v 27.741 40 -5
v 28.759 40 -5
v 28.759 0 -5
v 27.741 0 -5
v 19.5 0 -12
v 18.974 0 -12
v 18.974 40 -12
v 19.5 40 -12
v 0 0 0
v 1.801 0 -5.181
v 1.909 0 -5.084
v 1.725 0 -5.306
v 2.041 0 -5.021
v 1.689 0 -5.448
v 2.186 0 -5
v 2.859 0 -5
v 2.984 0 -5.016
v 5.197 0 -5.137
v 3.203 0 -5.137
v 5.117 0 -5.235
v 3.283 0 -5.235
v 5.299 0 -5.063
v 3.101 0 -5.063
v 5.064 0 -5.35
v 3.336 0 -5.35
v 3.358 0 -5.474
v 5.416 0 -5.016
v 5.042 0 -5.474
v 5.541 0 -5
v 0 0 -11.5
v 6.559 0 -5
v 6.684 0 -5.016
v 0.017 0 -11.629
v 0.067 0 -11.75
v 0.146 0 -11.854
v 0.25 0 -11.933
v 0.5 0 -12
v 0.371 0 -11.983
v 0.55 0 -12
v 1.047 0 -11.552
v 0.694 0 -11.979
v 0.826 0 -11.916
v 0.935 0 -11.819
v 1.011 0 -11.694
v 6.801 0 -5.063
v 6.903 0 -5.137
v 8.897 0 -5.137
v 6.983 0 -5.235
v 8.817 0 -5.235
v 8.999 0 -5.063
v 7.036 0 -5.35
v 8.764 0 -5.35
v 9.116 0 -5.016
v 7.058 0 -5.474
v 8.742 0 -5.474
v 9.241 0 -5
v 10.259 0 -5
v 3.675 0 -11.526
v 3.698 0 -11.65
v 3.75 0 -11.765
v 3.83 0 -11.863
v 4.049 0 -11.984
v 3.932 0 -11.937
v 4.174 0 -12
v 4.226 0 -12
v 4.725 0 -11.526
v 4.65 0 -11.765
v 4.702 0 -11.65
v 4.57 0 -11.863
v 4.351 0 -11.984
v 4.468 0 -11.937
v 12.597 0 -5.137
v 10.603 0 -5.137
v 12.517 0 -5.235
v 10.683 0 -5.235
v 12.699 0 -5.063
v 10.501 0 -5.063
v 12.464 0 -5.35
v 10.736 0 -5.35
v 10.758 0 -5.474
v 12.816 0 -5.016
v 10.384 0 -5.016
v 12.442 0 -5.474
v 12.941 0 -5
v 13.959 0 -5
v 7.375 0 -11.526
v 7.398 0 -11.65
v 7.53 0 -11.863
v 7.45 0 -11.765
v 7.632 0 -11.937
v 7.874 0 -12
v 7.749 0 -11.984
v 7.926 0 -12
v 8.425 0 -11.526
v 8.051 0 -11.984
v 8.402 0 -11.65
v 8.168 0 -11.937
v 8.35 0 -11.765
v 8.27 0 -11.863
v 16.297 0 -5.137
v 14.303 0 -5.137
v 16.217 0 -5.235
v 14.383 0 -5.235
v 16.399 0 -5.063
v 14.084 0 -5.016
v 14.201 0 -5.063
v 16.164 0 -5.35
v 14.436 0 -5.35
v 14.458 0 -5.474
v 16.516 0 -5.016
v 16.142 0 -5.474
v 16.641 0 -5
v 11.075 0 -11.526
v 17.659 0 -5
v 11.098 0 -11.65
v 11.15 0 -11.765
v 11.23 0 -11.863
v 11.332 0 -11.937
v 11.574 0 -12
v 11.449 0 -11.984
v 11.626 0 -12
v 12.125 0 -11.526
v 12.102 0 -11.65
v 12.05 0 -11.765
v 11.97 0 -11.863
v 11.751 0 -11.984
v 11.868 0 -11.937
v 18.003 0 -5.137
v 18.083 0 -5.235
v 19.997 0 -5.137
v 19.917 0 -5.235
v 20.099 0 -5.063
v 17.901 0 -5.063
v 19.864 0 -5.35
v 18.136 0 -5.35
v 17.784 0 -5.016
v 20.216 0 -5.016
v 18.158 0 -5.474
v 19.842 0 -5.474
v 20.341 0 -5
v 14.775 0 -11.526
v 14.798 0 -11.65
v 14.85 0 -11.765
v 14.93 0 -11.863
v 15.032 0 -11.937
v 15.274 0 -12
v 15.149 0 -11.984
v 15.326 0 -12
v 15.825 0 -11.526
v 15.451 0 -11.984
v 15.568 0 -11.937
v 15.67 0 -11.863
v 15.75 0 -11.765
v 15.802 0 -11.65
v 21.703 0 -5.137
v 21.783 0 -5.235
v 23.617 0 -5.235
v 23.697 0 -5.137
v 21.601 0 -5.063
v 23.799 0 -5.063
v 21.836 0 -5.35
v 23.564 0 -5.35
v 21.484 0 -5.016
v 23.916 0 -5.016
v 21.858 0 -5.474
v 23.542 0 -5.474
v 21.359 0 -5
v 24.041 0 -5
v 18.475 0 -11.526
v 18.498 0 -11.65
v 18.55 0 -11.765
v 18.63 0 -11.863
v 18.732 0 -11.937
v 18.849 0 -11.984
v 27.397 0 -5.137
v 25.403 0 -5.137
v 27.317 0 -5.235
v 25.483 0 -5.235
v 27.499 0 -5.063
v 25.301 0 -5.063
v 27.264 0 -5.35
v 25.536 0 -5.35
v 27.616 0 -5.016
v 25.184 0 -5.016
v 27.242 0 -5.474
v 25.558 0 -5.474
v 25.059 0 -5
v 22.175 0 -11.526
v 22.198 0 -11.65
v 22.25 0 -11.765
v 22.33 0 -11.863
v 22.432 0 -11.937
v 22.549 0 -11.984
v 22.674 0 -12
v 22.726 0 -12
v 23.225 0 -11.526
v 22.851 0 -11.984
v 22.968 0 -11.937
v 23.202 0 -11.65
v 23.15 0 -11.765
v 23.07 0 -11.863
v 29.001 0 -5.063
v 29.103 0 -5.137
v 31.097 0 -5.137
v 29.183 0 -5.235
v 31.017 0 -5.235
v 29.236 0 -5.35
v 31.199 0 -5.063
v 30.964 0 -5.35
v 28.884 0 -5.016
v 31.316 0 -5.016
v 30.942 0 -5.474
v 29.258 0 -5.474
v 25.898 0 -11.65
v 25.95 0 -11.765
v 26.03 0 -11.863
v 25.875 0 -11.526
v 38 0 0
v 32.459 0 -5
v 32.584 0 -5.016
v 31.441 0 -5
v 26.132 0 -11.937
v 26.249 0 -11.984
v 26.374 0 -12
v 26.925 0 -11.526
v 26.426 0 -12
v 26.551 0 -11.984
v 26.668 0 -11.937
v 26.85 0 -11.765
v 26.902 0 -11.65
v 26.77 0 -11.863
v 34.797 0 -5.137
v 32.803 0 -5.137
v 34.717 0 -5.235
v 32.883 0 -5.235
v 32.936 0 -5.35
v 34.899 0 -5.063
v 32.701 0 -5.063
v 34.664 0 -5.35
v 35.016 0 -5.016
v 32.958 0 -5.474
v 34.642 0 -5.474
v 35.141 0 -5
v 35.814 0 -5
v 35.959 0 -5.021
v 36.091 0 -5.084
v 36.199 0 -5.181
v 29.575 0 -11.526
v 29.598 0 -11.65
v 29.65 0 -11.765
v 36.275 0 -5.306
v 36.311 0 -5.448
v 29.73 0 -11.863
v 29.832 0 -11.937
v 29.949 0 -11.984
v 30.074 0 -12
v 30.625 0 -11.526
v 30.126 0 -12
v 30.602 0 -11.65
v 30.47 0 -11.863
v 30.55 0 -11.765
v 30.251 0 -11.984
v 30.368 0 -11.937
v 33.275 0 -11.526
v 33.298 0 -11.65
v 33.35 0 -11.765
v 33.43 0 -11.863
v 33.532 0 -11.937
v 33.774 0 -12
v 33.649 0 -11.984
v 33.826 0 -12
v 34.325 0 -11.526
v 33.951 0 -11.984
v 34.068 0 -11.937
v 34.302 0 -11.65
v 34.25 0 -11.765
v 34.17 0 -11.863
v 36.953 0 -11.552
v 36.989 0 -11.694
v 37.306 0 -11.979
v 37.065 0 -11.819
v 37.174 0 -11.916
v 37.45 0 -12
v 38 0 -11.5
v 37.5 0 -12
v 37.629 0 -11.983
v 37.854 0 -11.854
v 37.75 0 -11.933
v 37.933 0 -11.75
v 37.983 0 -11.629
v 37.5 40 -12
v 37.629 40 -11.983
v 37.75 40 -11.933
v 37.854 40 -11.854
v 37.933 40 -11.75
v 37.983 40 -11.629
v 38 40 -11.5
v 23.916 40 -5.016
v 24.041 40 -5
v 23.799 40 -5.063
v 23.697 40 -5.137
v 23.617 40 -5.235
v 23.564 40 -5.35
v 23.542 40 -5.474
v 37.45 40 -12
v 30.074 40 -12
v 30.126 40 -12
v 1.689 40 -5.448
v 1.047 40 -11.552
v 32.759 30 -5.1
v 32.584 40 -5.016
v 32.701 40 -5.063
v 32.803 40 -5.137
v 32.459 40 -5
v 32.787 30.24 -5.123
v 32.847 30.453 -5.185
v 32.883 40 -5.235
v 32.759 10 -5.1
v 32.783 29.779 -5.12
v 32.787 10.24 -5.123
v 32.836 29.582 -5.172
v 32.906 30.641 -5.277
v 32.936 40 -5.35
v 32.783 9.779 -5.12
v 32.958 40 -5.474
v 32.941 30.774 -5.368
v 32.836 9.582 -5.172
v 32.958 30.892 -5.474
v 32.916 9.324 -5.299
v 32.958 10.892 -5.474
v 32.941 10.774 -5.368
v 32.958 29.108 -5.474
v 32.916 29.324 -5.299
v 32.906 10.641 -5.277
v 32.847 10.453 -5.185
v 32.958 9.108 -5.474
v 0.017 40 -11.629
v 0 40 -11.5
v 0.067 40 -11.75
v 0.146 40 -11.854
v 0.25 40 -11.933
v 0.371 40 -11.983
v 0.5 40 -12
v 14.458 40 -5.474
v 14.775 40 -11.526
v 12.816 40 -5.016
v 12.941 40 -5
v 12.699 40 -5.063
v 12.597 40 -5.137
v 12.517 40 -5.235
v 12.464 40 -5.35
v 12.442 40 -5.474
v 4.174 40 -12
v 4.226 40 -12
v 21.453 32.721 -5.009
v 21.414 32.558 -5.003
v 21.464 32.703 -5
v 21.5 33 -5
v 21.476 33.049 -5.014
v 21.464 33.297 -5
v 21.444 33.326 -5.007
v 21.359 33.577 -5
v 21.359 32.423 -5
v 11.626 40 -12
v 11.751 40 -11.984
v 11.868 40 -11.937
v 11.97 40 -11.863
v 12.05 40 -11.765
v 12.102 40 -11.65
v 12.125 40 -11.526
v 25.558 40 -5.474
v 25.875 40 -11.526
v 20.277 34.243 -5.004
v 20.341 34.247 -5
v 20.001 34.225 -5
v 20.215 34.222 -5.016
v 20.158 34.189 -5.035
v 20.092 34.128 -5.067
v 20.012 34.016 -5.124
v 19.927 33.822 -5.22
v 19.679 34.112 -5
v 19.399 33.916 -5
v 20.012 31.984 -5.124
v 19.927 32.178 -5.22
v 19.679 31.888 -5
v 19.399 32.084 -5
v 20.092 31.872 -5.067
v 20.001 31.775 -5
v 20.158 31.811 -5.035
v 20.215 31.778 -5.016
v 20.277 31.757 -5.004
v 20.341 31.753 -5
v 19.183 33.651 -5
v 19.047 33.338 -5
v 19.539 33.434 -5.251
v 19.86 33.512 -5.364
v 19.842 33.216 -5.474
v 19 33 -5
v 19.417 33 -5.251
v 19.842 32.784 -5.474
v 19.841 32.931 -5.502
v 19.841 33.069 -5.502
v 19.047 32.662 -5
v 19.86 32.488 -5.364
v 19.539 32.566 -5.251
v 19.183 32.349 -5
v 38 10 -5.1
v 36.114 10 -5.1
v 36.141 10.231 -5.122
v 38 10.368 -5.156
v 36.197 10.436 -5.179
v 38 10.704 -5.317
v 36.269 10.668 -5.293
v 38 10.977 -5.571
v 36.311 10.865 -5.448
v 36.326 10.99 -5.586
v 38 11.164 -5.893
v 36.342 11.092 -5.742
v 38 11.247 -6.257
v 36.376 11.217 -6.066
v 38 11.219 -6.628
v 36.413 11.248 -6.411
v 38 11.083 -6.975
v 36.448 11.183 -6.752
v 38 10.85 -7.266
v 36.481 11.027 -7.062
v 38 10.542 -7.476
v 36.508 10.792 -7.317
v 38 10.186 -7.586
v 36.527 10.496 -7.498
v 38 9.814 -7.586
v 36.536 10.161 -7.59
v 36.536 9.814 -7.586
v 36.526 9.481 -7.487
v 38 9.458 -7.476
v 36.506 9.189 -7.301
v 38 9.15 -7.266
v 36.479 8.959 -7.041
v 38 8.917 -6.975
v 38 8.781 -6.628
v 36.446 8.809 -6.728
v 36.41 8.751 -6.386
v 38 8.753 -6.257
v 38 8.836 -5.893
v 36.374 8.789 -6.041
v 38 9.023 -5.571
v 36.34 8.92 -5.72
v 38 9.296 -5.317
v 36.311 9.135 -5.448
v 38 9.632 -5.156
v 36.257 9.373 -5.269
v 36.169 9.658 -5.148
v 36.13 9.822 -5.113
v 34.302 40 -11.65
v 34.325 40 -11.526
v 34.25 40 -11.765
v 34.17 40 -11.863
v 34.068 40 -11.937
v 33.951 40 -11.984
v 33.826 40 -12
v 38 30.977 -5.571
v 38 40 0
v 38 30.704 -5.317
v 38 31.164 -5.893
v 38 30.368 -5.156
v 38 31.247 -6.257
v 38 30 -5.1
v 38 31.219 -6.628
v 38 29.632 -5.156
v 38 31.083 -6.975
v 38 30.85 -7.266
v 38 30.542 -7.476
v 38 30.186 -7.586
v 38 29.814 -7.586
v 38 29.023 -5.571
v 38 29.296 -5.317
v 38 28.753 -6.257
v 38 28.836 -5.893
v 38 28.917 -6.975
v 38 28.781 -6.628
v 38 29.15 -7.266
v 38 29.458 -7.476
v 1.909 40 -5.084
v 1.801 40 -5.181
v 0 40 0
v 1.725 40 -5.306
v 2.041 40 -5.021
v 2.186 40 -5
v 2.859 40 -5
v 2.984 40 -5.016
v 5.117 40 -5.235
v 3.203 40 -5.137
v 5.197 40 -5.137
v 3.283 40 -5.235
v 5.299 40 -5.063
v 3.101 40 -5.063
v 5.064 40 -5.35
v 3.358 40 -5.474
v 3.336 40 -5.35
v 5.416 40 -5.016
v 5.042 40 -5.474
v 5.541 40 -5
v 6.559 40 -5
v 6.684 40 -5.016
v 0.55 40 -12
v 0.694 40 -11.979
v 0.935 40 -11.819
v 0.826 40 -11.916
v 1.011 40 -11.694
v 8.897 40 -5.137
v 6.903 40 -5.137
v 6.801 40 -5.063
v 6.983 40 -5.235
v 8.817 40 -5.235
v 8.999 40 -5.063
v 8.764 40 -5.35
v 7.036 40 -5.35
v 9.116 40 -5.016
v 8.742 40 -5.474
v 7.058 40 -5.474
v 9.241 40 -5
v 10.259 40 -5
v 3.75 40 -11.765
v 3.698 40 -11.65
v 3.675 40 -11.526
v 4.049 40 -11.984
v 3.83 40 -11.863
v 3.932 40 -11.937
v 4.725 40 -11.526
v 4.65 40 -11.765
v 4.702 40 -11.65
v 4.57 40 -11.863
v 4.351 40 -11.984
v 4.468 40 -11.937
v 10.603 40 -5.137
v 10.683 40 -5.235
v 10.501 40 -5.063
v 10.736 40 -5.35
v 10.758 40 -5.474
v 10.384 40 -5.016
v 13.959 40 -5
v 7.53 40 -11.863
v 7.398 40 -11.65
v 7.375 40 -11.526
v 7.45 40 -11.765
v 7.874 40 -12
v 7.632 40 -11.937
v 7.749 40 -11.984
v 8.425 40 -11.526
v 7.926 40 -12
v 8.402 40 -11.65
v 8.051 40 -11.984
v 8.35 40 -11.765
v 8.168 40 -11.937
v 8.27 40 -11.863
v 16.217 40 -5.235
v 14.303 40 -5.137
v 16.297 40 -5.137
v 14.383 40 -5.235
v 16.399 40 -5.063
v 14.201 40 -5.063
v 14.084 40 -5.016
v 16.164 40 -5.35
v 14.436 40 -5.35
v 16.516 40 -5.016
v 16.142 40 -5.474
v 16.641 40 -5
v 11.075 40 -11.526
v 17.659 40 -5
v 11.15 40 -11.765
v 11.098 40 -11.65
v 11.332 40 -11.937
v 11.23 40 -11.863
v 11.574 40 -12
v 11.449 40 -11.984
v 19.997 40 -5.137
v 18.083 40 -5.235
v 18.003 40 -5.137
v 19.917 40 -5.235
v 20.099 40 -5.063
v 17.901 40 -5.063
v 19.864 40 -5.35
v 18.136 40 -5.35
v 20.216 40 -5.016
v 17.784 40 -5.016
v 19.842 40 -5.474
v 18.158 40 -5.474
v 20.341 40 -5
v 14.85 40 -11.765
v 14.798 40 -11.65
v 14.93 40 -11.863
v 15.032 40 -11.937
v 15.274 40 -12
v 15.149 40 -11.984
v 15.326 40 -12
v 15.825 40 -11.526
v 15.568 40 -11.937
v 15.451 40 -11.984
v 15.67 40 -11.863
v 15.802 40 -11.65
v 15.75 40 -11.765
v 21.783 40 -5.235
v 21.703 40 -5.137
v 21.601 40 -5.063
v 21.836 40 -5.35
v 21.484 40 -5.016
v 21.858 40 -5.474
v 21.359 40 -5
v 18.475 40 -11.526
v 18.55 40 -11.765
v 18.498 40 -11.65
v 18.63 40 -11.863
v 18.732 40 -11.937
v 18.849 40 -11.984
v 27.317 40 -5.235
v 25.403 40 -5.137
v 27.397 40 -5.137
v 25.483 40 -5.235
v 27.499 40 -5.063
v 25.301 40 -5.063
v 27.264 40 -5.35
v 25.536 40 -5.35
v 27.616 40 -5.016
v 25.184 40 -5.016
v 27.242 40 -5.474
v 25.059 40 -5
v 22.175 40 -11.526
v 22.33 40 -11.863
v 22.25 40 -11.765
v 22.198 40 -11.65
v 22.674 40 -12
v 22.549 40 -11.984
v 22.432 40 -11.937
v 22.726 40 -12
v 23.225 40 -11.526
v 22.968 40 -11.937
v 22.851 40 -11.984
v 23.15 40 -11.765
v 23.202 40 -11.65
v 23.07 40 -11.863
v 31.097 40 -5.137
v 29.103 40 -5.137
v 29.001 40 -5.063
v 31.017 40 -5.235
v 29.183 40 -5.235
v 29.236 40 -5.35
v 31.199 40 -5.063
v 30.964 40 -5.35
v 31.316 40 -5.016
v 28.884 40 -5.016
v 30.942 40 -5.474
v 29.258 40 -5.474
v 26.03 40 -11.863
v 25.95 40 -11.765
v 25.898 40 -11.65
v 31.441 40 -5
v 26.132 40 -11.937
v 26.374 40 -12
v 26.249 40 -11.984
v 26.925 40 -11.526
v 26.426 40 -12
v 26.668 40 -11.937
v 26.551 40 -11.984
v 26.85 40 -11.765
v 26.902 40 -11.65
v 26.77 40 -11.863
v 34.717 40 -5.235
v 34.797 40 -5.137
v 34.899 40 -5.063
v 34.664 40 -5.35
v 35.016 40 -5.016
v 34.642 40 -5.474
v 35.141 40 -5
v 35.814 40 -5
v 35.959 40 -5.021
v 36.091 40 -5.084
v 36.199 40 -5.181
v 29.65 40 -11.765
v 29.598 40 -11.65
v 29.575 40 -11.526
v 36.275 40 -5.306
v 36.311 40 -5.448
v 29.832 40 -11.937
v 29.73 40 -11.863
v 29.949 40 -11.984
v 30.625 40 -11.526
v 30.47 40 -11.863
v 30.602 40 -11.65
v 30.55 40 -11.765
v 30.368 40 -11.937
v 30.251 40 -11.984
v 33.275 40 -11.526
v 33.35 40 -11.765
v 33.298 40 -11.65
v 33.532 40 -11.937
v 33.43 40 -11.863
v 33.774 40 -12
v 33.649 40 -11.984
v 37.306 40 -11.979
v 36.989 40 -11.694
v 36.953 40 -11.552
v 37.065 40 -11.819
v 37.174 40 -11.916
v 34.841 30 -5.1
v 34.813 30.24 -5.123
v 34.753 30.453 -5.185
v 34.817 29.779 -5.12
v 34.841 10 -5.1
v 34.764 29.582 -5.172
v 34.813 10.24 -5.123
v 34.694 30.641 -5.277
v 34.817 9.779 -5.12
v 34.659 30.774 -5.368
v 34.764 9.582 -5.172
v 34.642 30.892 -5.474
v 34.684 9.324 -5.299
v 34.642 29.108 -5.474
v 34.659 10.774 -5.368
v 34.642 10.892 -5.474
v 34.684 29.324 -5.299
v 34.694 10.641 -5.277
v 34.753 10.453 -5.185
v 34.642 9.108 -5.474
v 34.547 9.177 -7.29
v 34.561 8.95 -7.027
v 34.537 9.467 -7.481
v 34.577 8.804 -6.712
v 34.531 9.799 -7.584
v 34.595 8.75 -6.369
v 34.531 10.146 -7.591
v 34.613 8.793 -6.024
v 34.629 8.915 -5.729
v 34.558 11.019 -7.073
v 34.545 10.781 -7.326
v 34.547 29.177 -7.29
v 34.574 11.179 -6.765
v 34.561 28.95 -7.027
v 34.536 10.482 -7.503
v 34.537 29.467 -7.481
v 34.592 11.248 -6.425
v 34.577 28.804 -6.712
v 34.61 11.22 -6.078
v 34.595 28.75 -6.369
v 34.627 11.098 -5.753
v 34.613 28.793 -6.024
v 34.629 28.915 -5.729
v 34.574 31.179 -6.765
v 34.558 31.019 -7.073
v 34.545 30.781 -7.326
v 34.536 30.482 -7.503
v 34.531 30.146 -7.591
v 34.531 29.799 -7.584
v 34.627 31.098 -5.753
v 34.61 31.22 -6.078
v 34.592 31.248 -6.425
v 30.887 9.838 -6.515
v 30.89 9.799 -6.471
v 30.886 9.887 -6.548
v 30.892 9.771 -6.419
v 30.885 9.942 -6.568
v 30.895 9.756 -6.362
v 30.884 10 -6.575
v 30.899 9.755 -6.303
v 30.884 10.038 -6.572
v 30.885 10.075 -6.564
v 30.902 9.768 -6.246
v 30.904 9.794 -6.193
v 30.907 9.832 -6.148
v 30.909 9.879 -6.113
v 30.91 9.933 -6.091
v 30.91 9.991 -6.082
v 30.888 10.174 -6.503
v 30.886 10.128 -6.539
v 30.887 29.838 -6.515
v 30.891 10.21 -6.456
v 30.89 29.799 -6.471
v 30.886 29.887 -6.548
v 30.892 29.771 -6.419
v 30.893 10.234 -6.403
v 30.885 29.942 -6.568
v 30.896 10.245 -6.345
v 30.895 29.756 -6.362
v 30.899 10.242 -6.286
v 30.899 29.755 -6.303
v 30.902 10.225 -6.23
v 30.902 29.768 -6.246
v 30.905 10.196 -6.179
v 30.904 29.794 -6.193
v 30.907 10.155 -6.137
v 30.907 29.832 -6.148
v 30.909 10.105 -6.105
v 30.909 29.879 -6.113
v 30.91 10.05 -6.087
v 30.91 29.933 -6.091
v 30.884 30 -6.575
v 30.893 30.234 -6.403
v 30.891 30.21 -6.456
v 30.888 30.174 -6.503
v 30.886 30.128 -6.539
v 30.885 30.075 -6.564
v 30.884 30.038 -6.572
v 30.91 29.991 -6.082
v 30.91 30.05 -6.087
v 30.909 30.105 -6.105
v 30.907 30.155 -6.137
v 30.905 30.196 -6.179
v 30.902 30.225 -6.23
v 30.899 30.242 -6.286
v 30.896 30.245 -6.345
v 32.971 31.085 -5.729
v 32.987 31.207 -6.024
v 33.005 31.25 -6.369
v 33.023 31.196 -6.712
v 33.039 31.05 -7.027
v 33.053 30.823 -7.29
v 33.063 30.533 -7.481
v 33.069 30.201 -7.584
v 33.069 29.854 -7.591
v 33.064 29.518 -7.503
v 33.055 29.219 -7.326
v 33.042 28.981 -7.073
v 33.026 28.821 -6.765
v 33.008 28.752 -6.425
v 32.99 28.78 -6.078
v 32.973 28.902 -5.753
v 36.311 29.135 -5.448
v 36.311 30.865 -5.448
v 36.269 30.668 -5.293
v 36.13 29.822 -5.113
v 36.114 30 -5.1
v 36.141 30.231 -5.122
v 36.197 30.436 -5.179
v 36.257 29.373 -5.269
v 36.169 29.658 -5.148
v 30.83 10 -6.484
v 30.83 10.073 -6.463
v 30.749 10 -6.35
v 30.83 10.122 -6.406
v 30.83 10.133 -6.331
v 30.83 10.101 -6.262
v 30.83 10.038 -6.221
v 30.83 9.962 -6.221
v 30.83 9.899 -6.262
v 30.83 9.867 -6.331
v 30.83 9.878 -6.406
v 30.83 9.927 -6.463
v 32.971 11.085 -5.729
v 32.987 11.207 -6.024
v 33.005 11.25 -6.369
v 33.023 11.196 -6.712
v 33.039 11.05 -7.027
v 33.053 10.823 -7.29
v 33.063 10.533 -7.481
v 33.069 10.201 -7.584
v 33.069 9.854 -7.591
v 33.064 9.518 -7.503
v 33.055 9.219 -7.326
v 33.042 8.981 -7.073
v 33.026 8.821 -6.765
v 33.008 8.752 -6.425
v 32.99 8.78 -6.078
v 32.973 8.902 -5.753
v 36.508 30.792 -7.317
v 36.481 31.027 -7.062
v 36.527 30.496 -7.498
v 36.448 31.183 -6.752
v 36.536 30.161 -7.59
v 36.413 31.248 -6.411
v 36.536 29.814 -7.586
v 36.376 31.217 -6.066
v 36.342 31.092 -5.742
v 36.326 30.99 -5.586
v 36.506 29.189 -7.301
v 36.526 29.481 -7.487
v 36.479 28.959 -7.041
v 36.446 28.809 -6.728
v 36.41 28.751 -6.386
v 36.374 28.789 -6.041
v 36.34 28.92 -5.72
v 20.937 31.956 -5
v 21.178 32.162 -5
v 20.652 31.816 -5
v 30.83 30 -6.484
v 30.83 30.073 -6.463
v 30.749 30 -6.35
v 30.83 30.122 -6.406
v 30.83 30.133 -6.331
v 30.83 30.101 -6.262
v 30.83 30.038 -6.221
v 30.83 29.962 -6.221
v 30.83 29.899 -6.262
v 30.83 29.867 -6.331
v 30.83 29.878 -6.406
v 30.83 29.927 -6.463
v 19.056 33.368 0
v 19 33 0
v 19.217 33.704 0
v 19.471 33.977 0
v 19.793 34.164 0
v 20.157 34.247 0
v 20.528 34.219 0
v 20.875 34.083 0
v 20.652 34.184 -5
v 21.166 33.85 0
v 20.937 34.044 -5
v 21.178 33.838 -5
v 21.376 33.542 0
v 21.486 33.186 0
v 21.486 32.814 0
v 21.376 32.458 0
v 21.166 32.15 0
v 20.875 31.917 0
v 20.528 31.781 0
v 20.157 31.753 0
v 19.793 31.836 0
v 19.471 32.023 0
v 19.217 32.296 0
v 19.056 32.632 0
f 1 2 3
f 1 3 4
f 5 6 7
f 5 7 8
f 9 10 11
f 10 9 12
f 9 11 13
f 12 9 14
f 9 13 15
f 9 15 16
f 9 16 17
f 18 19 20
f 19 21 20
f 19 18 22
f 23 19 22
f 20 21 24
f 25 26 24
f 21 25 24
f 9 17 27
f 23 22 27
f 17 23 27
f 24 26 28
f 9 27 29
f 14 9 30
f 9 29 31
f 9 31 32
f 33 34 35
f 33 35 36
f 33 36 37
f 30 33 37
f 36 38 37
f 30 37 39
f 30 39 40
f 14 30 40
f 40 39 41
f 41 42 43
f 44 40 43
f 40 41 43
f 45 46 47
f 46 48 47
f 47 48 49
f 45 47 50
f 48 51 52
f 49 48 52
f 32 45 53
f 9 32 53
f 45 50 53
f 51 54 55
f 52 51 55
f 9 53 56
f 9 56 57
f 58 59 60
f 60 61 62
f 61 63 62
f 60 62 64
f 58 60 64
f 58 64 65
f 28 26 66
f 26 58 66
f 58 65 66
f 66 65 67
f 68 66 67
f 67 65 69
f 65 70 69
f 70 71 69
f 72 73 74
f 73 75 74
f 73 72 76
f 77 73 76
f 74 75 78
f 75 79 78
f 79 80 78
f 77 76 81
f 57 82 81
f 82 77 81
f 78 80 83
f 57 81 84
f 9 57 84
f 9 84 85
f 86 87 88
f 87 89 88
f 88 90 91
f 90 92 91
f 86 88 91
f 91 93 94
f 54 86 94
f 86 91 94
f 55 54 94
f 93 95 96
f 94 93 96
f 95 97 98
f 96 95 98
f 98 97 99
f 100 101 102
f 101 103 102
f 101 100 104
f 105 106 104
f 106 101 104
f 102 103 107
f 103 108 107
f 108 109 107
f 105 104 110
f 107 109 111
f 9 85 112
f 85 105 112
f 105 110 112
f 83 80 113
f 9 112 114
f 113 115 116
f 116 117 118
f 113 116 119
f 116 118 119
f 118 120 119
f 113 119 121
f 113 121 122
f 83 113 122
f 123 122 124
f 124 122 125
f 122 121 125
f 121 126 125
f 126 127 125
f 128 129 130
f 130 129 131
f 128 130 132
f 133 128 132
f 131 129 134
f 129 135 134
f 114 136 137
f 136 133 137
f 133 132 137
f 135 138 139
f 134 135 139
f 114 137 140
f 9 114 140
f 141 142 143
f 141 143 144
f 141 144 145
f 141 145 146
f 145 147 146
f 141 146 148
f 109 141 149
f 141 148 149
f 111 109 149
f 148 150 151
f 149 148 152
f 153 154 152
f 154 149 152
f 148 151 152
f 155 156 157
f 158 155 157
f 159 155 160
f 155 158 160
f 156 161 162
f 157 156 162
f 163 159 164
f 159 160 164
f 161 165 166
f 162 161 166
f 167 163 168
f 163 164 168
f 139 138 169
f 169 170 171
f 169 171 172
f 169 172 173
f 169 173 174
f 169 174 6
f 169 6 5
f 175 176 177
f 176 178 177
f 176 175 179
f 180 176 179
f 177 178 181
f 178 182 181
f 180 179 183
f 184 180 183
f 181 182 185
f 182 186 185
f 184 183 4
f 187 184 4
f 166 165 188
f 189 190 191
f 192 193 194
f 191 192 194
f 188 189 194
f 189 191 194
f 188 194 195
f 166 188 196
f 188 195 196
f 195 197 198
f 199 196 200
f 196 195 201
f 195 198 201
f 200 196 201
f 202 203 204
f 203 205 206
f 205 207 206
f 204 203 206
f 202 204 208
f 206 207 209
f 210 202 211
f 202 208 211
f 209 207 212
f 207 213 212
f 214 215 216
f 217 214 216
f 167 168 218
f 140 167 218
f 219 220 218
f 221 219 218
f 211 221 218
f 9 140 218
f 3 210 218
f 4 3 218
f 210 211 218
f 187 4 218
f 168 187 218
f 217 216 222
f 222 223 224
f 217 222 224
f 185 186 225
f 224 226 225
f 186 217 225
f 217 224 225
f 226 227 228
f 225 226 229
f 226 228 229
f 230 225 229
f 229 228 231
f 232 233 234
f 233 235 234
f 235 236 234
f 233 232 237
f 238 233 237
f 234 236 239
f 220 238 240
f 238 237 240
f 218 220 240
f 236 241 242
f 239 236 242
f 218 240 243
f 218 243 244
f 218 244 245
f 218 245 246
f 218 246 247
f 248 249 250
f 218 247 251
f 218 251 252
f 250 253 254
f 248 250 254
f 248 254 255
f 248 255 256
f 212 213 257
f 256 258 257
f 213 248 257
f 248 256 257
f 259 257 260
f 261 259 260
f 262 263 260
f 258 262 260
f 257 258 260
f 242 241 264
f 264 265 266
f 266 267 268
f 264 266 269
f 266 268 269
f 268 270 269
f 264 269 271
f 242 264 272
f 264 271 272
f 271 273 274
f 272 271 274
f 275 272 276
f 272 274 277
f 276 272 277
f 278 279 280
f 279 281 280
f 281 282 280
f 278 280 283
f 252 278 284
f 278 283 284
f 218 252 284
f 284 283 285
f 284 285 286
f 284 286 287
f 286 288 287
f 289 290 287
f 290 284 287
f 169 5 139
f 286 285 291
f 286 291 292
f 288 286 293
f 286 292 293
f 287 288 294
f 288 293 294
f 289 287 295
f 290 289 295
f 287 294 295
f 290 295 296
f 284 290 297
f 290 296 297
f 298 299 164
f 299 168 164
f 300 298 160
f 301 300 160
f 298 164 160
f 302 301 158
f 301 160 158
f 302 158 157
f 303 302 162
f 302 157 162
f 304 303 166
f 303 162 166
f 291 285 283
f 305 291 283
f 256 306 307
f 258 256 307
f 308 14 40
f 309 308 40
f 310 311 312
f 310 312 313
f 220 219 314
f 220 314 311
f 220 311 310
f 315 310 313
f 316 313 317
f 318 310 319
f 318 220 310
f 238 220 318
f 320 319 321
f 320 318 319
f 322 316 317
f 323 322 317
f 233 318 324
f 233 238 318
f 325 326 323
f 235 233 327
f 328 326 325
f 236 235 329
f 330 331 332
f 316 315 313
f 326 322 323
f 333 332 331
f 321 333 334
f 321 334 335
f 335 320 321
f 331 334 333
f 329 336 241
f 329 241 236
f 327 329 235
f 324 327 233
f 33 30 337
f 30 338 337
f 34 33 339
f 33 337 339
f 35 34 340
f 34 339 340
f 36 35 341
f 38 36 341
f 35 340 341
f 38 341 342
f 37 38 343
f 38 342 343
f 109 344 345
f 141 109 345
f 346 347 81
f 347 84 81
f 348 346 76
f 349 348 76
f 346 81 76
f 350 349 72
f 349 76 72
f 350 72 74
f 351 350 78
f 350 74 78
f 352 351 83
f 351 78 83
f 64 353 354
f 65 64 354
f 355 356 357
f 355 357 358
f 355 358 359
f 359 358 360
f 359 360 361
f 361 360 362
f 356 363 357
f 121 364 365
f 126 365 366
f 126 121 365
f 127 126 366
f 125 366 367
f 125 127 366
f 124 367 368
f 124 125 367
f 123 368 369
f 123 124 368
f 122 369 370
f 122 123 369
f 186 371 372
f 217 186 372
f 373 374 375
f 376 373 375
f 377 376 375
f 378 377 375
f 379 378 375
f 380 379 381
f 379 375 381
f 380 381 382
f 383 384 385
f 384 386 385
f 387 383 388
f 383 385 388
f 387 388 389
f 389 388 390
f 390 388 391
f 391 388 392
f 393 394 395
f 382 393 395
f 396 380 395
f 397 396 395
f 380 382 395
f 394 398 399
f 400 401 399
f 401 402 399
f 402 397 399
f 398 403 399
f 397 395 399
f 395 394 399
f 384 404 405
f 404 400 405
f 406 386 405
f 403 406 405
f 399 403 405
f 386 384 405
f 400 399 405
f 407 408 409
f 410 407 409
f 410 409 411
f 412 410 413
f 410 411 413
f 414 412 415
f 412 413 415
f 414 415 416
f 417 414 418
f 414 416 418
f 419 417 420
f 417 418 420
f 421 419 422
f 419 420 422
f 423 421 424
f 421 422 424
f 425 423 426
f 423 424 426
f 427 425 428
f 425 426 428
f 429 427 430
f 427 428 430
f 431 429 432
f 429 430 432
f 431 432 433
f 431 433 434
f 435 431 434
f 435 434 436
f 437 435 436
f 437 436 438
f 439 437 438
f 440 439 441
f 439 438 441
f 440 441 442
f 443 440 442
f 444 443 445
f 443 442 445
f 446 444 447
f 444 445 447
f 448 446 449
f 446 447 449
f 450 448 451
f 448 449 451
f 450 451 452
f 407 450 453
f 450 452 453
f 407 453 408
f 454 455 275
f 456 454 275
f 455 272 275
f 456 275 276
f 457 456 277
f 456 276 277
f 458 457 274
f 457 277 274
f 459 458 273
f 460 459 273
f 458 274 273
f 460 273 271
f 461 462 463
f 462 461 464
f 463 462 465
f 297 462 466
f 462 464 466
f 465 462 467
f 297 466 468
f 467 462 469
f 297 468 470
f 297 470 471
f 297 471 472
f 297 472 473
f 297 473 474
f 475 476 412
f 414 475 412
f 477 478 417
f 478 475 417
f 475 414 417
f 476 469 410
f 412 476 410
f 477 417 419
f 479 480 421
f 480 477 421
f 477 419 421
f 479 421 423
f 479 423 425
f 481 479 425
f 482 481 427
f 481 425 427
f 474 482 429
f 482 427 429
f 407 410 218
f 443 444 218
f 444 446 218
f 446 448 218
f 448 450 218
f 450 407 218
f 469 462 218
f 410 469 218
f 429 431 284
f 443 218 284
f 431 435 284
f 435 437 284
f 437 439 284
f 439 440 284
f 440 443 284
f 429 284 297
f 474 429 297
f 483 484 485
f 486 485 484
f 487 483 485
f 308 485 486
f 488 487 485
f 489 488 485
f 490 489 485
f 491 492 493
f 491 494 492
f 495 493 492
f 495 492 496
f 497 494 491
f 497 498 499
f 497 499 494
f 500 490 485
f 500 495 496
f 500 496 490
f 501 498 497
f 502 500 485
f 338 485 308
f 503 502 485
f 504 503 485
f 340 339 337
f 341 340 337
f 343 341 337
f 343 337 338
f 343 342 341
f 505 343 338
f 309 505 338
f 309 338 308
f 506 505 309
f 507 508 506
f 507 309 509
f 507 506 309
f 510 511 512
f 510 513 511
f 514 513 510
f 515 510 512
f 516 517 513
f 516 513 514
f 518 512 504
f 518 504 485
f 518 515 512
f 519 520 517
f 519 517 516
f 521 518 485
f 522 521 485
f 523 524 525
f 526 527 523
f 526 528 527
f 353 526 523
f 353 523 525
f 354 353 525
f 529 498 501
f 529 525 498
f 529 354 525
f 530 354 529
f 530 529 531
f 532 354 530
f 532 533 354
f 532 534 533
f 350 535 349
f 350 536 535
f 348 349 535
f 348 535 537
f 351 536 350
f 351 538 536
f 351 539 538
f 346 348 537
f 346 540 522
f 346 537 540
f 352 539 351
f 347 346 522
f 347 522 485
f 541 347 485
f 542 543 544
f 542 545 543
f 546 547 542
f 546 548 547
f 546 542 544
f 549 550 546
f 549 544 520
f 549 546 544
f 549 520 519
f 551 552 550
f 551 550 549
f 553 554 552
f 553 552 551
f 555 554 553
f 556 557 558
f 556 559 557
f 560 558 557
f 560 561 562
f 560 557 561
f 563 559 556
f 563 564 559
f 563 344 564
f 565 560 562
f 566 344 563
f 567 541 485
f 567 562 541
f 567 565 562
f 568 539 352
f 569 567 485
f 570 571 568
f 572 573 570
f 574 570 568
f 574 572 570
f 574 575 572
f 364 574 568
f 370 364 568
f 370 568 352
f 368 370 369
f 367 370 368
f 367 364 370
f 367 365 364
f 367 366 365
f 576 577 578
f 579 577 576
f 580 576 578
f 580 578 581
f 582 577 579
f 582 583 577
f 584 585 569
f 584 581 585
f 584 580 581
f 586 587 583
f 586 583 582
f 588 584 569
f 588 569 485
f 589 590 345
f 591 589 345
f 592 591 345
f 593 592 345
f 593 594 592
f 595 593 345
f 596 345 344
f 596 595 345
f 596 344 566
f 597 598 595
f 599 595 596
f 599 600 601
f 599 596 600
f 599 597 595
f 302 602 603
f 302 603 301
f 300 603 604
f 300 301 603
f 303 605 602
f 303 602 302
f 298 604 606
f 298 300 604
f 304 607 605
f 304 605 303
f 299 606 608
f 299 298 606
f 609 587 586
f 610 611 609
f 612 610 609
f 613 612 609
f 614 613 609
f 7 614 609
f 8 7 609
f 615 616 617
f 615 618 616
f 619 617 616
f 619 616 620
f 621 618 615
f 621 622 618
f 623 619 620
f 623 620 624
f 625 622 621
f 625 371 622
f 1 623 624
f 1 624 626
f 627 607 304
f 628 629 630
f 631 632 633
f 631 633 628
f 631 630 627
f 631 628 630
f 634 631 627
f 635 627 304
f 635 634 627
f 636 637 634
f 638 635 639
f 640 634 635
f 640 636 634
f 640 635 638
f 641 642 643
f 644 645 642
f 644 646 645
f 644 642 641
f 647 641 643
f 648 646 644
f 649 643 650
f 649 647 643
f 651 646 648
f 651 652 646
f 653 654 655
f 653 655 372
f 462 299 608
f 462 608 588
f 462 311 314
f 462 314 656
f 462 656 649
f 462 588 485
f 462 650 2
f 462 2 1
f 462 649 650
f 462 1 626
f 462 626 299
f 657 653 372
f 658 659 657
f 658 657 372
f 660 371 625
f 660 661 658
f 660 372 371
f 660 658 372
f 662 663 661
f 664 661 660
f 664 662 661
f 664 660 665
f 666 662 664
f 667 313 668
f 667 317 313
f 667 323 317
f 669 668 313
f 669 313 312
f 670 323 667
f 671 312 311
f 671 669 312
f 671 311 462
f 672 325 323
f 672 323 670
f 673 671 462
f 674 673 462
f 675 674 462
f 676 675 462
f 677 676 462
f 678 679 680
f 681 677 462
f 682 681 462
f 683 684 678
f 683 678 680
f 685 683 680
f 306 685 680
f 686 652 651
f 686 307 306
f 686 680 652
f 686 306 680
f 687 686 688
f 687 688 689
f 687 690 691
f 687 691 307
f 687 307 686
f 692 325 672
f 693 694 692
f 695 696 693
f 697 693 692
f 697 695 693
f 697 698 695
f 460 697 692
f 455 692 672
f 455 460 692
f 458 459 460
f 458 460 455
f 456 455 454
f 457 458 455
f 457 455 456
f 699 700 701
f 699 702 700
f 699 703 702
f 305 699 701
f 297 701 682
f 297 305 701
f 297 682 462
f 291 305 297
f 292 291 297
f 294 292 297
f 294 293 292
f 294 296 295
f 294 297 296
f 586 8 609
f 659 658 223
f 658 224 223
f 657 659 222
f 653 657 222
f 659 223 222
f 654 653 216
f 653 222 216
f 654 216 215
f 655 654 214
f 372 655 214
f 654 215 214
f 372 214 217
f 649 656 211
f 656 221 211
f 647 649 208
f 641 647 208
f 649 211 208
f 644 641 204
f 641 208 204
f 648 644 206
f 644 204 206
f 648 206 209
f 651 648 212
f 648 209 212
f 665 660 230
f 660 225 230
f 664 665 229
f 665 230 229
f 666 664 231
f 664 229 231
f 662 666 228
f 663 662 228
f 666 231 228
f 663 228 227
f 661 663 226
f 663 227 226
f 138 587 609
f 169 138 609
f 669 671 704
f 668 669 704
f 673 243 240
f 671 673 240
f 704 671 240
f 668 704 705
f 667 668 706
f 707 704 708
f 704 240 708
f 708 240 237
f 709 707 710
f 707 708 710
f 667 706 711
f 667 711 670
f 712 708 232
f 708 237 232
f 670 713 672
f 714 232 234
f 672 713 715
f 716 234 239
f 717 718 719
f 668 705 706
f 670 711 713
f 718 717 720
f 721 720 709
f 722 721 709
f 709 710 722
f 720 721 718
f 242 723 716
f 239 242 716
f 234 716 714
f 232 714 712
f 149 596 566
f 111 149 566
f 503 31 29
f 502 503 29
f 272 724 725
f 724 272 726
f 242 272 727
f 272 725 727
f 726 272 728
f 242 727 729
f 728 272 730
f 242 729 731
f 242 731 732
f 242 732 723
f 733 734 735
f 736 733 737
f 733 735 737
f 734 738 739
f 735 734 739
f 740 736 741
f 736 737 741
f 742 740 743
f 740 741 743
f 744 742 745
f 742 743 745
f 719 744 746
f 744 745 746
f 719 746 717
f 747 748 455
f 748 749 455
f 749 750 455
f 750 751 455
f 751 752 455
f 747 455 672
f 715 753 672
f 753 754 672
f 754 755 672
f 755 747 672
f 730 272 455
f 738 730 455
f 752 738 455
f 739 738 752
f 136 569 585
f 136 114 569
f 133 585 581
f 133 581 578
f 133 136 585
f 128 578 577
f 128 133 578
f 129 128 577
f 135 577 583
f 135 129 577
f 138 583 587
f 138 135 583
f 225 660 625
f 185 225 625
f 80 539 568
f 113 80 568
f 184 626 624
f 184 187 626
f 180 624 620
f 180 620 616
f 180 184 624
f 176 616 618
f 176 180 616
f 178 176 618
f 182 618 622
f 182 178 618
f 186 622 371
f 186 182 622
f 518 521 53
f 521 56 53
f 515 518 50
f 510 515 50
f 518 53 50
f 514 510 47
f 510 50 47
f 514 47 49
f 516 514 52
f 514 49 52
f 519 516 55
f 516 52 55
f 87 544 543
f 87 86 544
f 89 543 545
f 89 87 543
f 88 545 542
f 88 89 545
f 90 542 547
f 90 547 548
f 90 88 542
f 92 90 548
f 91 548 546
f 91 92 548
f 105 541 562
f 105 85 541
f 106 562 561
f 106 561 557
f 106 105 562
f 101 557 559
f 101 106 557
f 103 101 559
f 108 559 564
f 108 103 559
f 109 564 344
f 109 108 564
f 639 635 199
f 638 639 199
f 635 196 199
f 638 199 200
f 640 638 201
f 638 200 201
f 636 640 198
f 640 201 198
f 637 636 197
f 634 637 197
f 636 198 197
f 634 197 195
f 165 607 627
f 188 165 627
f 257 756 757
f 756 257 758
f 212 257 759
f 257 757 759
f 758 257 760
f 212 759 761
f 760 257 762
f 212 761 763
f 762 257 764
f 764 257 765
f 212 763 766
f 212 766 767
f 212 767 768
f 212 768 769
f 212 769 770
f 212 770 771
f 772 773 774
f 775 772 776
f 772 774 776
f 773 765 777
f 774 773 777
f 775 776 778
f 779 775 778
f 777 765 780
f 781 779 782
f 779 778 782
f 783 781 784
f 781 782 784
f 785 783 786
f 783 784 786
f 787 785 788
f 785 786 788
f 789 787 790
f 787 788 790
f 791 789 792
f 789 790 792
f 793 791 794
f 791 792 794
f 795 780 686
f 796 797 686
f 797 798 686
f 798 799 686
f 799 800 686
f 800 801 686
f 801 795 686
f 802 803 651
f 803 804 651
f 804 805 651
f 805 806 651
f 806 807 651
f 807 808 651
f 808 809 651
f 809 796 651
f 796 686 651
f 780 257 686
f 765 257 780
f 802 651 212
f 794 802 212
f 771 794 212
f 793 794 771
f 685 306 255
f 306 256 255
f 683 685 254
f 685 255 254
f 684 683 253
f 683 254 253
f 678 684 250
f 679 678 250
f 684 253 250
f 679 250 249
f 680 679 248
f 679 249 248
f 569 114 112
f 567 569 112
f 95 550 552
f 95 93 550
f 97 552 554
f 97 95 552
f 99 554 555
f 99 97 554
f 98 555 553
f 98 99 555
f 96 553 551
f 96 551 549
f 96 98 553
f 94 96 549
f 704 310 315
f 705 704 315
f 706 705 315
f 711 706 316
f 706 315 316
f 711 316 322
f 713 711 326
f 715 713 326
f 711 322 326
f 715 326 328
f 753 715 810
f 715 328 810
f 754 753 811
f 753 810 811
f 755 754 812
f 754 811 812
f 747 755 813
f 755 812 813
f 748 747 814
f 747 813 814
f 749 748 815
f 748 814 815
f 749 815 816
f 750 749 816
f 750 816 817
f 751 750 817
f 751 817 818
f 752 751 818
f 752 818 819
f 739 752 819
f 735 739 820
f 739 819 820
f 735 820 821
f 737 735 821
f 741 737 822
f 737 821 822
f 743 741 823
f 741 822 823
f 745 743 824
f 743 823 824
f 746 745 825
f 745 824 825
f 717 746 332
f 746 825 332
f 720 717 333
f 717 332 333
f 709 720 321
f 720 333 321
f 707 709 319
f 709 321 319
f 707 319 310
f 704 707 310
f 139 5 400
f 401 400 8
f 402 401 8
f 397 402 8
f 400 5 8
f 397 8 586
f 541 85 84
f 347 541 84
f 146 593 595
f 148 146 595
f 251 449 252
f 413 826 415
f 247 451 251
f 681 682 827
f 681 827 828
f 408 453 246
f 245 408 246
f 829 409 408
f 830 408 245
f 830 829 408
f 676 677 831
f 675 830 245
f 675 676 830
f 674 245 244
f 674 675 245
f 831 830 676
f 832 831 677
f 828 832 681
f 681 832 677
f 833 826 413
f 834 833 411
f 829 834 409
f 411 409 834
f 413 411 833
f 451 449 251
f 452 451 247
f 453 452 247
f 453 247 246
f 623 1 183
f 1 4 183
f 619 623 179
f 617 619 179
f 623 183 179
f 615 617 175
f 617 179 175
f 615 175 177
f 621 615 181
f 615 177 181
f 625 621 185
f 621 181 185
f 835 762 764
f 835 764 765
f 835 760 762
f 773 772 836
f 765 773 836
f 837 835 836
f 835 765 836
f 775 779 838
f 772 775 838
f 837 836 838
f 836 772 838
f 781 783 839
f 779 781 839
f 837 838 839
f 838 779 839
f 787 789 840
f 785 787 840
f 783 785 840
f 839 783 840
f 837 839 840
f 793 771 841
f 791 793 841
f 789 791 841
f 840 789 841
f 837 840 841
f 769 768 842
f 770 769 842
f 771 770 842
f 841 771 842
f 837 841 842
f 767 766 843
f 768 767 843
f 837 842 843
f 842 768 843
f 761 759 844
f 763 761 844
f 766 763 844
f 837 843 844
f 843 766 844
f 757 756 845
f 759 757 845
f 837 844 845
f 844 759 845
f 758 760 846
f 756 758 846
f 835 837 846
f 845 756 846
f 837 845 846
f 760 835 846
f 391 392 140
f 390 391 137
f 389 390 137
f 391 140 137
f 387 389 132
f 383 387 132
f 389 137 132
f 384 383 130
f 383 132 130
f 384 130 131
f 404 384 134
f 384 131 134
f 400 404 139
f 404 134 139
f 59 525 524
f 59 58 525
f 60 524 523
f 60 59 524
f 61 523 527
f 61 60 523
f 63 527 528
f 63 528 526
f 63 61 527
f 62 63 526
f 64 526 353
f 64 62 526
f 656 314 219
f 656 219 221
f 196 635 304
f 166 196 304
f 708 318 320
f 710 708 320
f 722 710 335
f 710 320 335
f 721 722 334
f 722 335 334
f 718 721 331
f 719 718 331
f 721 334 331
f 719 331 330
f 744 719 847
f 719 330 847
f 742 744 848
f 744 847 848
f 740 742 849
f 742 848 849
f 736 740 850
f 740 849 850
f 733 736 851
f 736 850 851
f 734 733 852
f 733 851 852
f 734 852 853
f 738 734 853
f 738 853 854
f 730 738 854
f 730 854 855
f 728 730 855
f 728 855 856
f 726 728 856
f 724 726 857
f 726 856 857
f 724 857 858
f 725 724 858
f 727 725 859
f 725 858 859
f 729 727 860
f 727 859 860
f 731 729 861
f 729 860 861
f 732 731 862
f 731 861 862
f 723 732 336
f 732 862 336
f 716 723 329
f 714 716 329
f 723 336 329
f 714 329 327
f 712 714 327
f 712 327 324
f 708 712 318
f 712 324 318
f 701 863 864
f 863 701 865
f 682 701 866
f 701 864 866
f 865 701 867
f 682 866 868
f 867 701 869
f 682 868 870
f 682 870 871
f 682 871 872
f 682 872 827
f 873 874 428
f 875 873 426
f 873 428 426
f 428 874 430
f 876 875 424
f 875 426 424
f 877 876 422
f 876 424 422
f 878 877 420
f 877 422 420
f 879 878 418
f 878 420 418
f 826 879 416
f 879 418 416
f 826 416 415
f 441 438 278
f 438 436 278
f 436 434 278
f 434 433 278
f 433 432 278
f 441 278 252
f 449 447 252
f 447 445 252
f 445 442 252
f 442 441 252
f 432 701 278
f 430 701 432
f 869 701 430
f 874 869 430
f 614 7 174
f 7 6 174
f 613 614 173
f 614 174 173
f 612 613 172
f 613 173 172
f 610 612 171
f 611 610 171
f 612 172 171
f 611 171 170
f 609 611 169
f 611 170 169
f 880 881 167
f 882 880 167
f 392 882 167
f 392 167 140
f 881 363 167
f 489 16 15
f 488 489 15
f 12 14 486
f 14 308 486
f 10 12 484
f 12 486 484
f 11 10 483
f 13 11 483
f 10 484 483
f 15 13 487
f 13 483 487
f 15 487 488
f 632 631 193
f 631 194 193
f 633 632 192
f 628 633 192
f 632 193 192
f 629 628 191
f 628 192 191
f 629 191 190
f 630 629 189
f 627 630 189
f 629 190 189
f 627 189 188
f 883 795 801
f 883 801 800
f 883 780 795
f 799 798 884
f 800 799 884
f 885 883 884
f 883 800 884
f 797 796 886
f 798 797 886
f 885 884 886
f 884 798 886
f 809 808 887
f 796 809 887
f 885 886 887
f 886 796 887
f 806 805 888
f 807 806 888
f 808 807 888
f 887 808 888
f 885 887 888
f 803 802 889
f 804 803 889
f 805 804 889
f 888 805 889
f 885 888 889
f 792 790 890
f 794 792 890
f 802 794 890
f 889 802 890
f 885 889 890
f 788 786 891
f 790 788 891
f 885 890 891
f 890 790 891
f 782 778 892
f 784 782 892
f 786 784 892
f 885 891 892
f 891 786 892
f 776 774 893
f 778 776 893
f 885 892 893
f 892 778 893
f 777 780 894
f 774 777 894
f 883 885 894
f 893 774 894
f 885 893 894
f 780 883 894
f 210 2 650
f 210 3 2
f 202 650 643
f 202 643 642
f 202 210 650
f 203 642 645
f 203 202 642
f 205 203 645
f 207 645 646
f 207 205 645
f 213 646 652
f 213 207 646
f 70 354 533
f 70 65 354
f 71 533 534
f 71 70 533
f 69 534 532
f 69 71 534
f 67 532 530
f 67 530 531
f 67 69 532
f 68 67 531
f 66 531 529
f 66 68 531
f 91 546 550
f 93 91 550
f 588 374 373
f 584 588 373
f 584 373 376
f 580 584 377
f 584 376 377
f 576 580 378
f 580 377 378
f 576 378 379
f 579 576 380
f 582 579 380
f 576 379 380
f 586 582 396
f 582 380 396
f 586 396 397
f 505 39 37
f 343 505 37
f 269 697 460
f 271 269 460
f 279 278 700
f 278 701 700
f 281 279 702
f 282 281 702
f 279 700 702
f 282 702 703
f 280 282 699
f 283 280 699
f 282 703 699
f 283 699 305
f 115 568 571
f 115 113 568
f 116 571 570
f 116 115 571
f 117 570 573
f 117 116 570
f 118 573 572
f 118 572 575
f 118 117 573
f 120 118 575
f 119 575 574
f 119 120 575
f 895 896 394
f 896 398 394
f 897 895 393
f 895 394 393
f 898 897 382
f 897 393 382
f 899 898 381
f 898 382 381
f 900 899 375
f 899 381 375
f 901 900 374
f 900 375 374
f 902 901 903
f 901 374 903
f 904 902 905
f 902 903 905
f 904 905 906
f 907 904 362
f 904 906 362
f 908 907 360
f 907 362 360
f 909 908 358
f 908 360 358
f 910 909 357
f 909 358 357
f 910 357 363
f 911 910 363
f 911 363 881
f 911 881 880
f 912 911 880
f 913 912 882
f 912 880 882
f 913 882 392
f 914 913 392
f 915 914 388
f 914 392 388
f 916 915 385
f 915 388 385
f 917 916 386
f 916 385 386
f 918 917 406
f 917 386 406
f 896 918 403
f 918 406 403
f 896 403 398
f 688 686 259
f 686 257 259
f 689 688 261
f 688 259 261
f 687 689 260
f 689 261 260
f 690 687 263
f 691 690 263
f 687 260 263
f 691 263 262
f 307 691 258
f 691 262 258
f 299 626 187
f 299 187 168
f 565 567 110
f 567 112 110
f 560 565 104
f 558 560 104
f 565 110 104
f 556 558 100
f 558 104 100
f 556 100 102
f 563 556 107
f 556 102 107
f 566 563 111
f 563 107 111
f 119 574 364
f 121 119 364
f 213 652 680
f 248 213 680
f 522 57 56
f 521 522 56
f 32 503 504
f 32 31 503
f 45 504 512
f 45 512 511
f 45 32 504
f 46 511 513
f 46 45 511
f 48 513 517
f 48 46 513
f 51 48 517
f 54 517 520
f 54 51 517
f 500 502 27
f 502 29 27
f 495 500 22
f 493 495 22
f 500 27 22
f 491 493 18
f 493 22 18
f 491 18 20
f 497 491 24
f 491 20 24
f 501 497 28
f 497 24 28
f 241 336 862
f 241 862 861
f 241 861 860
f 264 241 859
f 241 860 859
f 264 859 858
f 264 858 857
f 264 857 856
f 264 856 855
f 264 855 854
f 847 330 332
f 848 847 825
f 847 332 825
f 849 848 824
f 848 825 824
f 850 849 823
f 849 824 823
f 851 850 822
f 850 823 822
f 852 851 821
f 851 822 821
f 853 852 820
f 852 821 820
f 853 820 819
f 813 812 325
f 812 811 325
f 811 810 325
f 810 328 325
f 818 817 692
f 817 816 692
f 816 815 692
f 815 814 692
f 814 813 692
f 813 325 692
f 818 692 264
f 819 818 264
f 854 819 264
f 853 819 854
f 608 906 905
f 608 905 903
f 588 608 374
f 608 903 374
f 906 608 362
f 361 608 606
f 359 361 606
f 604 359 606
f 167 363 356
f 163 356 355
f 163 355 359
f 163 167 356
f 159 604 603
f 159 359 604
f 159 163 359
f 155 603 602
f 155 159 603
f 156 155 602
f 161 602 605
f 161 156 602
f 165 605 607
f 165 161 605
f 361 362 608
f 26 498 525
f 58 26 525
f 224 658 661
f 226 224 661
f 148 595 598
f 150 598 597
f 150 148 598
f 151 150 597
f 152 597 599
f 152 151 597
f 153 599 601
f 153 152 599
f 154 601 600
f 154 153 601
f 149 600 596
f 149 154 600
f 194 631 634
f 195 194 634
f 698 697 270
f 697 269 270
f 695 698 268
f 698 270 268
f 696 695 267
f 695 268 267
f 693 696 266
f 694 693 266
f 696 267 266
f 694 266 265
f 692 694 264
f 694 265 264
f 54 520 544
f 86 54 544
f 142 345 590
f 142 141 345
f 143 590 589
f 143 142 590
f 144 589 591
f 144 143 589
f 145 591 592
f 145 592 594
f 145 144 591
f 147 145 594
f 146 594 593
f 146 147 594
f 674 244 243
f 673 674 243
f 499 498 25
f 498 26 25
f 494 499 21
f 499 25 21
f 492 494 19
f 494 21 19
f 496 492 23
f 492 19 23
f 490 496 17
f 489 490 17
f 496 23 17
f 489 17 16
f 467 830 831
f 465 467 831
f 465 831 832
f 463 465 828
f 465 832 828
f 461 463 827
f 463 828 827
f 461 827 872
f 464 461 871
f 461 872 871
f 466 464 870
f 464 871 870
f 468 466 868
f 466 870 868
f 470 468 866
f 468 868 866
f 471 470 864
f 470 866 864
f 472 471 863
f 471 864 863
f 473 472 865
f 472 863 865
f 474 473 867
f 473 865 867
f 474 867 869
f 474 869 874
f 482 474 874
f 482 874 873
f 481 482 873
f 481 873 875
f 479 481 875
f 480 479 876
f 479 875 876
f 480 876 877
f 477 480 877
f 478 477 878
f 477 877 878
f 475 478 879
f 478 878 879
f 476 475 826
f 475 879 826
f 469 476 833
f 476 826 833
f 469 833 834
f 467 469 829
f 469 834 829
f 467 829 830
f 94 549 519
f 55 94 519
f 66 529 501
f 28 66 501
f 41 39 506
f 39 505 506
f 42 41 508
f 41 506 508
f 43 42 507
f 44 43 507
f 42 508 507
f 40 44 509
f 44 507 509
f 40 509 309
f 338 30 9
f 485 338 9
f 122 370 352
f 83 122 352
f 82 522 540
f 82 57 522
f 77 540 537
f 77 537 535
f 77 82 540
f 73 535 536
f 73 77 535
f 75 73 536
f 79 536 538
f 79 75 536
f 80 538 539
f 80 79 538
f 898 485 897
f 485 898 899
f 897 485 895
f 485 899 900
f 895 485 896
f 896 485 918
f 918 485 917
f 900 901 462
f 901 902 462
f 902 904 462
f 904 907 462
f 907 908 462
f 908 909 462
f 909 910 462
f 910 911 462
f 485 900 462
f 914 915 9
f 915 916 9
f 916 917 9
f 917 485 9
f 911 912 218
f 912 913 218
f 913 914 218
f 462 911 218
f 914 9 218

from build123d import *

# Parameters (mm, degrees)
EXTRUDE1_DEPTH            = 40
BOSS_EXTRUDE1_DEPTH       = 40
LPATTERN1_COUNT           = 9
LPATTERN1_PITCH           = 3.7
FILLET1_R                 = 0.5
FILLET2_R                 = 0.5
M3X0_5_TAPPED_HOLE1_D     = 2.5
M3X0_5_TAPPED_HOLE1_DEPTH = 6.5
M3X0_5_TAPPED_HOLE1_TIP   = 0.751075774
M3X0_5_TAPPED_HOLE2_D     = 2.5
M3X0_5_TAPPED_HOLE2_DEPTH = 5
M3X0_5_TAPPED_HOLE2_TIP   = 0.751075774


with BuildPart() as part:
    # Sketch1 → Extrude1 (new body)
    with BuildSketch(Plane(origin=(0, 0, 0), x_dir=(1, 0, 0), z_dir=(0, 1, 0))):
        Polygon((0, 12), (0, 0), (38, 0), (38, 12), (37, 12), (36.264270353, 5), (1.735729647, 5), (1, 12), align=None)
    extrude(amount=EXTRUDE1_DEPTH)

    # Sketch3 → Boss-Extrude1 (add)
    with BuildSketch(Plane(origin=(0, 40, 0), x_dir=(1, 0, 0), z_dir=(0, 1, 0))):
        Polygon((3.333145545, 5), (3.7, 12), (4.7, 12), (5.066854455, 5), align=None)
    boss_extrude1 = extrude(amount=-BOSS_EXTRUDE1_DEPTH)

    # LPattern1: Boss-Extrude1 ×9
    with Locations(*[(i * LPATTERN1_PITCH, 0, 0) for i in range(1, LPATTERN1_COUNT)]):
        add(boss_extrude1)

    # Fillet1
    fillet1_edges = [part.edges().sort_by_distance(p)[0] for p in [
        (34.666854455, 20, -5),
        (32.933145545, 20, -5),
        (1.735729647, 20, -5),
        (36.264270353, 20, -5),
        (5.066854455, 20, -5),
        (3.333145545, 20, -5),
        (8.766854455, 20, -5),
        (7.033145545, 20, -5),
        (12.466854455, 20, -5),
        (10.733145545, 20, -5),
        (16.166854455, 20, -5),
        (14.433145545, 20, -5),
        (19.866854455, 20, -5),
        (18.133145545, 20, -5),
        (23.566854455, 20, -5),
        (21.833145545, 20, -5),
        (27.266854455, 20, -5),
        (25.533145545, 20, -5),
        (30.966854455, 20, -5),
        (29.233145545, 20, -5),
    ]]
    fillet(fillet1_edges, radius=FILLET1_R)

    # Fillet2
    fillet2_edges = [part.edges().sort_by_distance(p)[0] for p in [
        (33.3, 20, -12),
        (34.3, 20, -12),
        (1, 20, -12),
        (37, 20, -12),
        (38, 20, -12),
        (0, 20, -12),
        (3.7, 20, -12),
        (4.7, 20, -12),
        (7.4, 20, -12),
        (8.4, 20, -12),
        (11.1, 20, -12),
        (12.1, 20, -12),
        (14.8, 20, -12),
        (15.8, 20, -12),
        (18.5, 20, -12),
        (22.2, 20, -12),
        (23.2, 20, -12),
        (25.9, 20, -12),
        (26.9, 20, -12),
        (29.6, 20, -12),
        (30.6, 20, -12),
    ]]
    fillet(fillet2_edges, radius=FILLET2_R)

    # M3x0.5 Tapped Hole1
    with Locations(Plane(origin=(38, 0, 0), x_dir=(0, 0, -1), z_dir=(1, 0, 0))):
        with Locations((6.35, 30), (6.35, 10)):
            Hole(M3X0_5_TAPPED_HOLE1_D / 2, depth=M3X0_5_TAPPED_HOLE1_DEPTH)
            with Locations((0, 0, -(M3X0_5_TAPPED_HOLE1_DEPTH + M3X0_5_TAPPED_HOLE1_TIP / 2))):  # 118° drill point
                Cone(0, M3X0_5_TAPPED_HOLE1_D / 2, M3X0_5_TAPPED_HOLE1_TIP, mode=Mode.SUBTRACT)

    # M3x0.5 Tapped Hole2
    with Locations(Plane.XY):
        with Locations((20.25, 33)):
            Hole(M3X0_5_TAPPED_HOLE2_D / 2, depth=M3X0_5_TAPPED_HOLE2_DEPTH)
            with Locations((0, 0, -(M3X0_5_TAPPED_HOLE2_DEPTH + M3X0_5_TAPPED_HOLE2_TIP / 2))):  # 118° drill point
                Cone(0, M3X0_5_TAPPED_HOLE2_D / 2, M3X0_5_TAPPED_HOLE2_TIP, mode=Mode.SUBTRACT)


solid = part.part
